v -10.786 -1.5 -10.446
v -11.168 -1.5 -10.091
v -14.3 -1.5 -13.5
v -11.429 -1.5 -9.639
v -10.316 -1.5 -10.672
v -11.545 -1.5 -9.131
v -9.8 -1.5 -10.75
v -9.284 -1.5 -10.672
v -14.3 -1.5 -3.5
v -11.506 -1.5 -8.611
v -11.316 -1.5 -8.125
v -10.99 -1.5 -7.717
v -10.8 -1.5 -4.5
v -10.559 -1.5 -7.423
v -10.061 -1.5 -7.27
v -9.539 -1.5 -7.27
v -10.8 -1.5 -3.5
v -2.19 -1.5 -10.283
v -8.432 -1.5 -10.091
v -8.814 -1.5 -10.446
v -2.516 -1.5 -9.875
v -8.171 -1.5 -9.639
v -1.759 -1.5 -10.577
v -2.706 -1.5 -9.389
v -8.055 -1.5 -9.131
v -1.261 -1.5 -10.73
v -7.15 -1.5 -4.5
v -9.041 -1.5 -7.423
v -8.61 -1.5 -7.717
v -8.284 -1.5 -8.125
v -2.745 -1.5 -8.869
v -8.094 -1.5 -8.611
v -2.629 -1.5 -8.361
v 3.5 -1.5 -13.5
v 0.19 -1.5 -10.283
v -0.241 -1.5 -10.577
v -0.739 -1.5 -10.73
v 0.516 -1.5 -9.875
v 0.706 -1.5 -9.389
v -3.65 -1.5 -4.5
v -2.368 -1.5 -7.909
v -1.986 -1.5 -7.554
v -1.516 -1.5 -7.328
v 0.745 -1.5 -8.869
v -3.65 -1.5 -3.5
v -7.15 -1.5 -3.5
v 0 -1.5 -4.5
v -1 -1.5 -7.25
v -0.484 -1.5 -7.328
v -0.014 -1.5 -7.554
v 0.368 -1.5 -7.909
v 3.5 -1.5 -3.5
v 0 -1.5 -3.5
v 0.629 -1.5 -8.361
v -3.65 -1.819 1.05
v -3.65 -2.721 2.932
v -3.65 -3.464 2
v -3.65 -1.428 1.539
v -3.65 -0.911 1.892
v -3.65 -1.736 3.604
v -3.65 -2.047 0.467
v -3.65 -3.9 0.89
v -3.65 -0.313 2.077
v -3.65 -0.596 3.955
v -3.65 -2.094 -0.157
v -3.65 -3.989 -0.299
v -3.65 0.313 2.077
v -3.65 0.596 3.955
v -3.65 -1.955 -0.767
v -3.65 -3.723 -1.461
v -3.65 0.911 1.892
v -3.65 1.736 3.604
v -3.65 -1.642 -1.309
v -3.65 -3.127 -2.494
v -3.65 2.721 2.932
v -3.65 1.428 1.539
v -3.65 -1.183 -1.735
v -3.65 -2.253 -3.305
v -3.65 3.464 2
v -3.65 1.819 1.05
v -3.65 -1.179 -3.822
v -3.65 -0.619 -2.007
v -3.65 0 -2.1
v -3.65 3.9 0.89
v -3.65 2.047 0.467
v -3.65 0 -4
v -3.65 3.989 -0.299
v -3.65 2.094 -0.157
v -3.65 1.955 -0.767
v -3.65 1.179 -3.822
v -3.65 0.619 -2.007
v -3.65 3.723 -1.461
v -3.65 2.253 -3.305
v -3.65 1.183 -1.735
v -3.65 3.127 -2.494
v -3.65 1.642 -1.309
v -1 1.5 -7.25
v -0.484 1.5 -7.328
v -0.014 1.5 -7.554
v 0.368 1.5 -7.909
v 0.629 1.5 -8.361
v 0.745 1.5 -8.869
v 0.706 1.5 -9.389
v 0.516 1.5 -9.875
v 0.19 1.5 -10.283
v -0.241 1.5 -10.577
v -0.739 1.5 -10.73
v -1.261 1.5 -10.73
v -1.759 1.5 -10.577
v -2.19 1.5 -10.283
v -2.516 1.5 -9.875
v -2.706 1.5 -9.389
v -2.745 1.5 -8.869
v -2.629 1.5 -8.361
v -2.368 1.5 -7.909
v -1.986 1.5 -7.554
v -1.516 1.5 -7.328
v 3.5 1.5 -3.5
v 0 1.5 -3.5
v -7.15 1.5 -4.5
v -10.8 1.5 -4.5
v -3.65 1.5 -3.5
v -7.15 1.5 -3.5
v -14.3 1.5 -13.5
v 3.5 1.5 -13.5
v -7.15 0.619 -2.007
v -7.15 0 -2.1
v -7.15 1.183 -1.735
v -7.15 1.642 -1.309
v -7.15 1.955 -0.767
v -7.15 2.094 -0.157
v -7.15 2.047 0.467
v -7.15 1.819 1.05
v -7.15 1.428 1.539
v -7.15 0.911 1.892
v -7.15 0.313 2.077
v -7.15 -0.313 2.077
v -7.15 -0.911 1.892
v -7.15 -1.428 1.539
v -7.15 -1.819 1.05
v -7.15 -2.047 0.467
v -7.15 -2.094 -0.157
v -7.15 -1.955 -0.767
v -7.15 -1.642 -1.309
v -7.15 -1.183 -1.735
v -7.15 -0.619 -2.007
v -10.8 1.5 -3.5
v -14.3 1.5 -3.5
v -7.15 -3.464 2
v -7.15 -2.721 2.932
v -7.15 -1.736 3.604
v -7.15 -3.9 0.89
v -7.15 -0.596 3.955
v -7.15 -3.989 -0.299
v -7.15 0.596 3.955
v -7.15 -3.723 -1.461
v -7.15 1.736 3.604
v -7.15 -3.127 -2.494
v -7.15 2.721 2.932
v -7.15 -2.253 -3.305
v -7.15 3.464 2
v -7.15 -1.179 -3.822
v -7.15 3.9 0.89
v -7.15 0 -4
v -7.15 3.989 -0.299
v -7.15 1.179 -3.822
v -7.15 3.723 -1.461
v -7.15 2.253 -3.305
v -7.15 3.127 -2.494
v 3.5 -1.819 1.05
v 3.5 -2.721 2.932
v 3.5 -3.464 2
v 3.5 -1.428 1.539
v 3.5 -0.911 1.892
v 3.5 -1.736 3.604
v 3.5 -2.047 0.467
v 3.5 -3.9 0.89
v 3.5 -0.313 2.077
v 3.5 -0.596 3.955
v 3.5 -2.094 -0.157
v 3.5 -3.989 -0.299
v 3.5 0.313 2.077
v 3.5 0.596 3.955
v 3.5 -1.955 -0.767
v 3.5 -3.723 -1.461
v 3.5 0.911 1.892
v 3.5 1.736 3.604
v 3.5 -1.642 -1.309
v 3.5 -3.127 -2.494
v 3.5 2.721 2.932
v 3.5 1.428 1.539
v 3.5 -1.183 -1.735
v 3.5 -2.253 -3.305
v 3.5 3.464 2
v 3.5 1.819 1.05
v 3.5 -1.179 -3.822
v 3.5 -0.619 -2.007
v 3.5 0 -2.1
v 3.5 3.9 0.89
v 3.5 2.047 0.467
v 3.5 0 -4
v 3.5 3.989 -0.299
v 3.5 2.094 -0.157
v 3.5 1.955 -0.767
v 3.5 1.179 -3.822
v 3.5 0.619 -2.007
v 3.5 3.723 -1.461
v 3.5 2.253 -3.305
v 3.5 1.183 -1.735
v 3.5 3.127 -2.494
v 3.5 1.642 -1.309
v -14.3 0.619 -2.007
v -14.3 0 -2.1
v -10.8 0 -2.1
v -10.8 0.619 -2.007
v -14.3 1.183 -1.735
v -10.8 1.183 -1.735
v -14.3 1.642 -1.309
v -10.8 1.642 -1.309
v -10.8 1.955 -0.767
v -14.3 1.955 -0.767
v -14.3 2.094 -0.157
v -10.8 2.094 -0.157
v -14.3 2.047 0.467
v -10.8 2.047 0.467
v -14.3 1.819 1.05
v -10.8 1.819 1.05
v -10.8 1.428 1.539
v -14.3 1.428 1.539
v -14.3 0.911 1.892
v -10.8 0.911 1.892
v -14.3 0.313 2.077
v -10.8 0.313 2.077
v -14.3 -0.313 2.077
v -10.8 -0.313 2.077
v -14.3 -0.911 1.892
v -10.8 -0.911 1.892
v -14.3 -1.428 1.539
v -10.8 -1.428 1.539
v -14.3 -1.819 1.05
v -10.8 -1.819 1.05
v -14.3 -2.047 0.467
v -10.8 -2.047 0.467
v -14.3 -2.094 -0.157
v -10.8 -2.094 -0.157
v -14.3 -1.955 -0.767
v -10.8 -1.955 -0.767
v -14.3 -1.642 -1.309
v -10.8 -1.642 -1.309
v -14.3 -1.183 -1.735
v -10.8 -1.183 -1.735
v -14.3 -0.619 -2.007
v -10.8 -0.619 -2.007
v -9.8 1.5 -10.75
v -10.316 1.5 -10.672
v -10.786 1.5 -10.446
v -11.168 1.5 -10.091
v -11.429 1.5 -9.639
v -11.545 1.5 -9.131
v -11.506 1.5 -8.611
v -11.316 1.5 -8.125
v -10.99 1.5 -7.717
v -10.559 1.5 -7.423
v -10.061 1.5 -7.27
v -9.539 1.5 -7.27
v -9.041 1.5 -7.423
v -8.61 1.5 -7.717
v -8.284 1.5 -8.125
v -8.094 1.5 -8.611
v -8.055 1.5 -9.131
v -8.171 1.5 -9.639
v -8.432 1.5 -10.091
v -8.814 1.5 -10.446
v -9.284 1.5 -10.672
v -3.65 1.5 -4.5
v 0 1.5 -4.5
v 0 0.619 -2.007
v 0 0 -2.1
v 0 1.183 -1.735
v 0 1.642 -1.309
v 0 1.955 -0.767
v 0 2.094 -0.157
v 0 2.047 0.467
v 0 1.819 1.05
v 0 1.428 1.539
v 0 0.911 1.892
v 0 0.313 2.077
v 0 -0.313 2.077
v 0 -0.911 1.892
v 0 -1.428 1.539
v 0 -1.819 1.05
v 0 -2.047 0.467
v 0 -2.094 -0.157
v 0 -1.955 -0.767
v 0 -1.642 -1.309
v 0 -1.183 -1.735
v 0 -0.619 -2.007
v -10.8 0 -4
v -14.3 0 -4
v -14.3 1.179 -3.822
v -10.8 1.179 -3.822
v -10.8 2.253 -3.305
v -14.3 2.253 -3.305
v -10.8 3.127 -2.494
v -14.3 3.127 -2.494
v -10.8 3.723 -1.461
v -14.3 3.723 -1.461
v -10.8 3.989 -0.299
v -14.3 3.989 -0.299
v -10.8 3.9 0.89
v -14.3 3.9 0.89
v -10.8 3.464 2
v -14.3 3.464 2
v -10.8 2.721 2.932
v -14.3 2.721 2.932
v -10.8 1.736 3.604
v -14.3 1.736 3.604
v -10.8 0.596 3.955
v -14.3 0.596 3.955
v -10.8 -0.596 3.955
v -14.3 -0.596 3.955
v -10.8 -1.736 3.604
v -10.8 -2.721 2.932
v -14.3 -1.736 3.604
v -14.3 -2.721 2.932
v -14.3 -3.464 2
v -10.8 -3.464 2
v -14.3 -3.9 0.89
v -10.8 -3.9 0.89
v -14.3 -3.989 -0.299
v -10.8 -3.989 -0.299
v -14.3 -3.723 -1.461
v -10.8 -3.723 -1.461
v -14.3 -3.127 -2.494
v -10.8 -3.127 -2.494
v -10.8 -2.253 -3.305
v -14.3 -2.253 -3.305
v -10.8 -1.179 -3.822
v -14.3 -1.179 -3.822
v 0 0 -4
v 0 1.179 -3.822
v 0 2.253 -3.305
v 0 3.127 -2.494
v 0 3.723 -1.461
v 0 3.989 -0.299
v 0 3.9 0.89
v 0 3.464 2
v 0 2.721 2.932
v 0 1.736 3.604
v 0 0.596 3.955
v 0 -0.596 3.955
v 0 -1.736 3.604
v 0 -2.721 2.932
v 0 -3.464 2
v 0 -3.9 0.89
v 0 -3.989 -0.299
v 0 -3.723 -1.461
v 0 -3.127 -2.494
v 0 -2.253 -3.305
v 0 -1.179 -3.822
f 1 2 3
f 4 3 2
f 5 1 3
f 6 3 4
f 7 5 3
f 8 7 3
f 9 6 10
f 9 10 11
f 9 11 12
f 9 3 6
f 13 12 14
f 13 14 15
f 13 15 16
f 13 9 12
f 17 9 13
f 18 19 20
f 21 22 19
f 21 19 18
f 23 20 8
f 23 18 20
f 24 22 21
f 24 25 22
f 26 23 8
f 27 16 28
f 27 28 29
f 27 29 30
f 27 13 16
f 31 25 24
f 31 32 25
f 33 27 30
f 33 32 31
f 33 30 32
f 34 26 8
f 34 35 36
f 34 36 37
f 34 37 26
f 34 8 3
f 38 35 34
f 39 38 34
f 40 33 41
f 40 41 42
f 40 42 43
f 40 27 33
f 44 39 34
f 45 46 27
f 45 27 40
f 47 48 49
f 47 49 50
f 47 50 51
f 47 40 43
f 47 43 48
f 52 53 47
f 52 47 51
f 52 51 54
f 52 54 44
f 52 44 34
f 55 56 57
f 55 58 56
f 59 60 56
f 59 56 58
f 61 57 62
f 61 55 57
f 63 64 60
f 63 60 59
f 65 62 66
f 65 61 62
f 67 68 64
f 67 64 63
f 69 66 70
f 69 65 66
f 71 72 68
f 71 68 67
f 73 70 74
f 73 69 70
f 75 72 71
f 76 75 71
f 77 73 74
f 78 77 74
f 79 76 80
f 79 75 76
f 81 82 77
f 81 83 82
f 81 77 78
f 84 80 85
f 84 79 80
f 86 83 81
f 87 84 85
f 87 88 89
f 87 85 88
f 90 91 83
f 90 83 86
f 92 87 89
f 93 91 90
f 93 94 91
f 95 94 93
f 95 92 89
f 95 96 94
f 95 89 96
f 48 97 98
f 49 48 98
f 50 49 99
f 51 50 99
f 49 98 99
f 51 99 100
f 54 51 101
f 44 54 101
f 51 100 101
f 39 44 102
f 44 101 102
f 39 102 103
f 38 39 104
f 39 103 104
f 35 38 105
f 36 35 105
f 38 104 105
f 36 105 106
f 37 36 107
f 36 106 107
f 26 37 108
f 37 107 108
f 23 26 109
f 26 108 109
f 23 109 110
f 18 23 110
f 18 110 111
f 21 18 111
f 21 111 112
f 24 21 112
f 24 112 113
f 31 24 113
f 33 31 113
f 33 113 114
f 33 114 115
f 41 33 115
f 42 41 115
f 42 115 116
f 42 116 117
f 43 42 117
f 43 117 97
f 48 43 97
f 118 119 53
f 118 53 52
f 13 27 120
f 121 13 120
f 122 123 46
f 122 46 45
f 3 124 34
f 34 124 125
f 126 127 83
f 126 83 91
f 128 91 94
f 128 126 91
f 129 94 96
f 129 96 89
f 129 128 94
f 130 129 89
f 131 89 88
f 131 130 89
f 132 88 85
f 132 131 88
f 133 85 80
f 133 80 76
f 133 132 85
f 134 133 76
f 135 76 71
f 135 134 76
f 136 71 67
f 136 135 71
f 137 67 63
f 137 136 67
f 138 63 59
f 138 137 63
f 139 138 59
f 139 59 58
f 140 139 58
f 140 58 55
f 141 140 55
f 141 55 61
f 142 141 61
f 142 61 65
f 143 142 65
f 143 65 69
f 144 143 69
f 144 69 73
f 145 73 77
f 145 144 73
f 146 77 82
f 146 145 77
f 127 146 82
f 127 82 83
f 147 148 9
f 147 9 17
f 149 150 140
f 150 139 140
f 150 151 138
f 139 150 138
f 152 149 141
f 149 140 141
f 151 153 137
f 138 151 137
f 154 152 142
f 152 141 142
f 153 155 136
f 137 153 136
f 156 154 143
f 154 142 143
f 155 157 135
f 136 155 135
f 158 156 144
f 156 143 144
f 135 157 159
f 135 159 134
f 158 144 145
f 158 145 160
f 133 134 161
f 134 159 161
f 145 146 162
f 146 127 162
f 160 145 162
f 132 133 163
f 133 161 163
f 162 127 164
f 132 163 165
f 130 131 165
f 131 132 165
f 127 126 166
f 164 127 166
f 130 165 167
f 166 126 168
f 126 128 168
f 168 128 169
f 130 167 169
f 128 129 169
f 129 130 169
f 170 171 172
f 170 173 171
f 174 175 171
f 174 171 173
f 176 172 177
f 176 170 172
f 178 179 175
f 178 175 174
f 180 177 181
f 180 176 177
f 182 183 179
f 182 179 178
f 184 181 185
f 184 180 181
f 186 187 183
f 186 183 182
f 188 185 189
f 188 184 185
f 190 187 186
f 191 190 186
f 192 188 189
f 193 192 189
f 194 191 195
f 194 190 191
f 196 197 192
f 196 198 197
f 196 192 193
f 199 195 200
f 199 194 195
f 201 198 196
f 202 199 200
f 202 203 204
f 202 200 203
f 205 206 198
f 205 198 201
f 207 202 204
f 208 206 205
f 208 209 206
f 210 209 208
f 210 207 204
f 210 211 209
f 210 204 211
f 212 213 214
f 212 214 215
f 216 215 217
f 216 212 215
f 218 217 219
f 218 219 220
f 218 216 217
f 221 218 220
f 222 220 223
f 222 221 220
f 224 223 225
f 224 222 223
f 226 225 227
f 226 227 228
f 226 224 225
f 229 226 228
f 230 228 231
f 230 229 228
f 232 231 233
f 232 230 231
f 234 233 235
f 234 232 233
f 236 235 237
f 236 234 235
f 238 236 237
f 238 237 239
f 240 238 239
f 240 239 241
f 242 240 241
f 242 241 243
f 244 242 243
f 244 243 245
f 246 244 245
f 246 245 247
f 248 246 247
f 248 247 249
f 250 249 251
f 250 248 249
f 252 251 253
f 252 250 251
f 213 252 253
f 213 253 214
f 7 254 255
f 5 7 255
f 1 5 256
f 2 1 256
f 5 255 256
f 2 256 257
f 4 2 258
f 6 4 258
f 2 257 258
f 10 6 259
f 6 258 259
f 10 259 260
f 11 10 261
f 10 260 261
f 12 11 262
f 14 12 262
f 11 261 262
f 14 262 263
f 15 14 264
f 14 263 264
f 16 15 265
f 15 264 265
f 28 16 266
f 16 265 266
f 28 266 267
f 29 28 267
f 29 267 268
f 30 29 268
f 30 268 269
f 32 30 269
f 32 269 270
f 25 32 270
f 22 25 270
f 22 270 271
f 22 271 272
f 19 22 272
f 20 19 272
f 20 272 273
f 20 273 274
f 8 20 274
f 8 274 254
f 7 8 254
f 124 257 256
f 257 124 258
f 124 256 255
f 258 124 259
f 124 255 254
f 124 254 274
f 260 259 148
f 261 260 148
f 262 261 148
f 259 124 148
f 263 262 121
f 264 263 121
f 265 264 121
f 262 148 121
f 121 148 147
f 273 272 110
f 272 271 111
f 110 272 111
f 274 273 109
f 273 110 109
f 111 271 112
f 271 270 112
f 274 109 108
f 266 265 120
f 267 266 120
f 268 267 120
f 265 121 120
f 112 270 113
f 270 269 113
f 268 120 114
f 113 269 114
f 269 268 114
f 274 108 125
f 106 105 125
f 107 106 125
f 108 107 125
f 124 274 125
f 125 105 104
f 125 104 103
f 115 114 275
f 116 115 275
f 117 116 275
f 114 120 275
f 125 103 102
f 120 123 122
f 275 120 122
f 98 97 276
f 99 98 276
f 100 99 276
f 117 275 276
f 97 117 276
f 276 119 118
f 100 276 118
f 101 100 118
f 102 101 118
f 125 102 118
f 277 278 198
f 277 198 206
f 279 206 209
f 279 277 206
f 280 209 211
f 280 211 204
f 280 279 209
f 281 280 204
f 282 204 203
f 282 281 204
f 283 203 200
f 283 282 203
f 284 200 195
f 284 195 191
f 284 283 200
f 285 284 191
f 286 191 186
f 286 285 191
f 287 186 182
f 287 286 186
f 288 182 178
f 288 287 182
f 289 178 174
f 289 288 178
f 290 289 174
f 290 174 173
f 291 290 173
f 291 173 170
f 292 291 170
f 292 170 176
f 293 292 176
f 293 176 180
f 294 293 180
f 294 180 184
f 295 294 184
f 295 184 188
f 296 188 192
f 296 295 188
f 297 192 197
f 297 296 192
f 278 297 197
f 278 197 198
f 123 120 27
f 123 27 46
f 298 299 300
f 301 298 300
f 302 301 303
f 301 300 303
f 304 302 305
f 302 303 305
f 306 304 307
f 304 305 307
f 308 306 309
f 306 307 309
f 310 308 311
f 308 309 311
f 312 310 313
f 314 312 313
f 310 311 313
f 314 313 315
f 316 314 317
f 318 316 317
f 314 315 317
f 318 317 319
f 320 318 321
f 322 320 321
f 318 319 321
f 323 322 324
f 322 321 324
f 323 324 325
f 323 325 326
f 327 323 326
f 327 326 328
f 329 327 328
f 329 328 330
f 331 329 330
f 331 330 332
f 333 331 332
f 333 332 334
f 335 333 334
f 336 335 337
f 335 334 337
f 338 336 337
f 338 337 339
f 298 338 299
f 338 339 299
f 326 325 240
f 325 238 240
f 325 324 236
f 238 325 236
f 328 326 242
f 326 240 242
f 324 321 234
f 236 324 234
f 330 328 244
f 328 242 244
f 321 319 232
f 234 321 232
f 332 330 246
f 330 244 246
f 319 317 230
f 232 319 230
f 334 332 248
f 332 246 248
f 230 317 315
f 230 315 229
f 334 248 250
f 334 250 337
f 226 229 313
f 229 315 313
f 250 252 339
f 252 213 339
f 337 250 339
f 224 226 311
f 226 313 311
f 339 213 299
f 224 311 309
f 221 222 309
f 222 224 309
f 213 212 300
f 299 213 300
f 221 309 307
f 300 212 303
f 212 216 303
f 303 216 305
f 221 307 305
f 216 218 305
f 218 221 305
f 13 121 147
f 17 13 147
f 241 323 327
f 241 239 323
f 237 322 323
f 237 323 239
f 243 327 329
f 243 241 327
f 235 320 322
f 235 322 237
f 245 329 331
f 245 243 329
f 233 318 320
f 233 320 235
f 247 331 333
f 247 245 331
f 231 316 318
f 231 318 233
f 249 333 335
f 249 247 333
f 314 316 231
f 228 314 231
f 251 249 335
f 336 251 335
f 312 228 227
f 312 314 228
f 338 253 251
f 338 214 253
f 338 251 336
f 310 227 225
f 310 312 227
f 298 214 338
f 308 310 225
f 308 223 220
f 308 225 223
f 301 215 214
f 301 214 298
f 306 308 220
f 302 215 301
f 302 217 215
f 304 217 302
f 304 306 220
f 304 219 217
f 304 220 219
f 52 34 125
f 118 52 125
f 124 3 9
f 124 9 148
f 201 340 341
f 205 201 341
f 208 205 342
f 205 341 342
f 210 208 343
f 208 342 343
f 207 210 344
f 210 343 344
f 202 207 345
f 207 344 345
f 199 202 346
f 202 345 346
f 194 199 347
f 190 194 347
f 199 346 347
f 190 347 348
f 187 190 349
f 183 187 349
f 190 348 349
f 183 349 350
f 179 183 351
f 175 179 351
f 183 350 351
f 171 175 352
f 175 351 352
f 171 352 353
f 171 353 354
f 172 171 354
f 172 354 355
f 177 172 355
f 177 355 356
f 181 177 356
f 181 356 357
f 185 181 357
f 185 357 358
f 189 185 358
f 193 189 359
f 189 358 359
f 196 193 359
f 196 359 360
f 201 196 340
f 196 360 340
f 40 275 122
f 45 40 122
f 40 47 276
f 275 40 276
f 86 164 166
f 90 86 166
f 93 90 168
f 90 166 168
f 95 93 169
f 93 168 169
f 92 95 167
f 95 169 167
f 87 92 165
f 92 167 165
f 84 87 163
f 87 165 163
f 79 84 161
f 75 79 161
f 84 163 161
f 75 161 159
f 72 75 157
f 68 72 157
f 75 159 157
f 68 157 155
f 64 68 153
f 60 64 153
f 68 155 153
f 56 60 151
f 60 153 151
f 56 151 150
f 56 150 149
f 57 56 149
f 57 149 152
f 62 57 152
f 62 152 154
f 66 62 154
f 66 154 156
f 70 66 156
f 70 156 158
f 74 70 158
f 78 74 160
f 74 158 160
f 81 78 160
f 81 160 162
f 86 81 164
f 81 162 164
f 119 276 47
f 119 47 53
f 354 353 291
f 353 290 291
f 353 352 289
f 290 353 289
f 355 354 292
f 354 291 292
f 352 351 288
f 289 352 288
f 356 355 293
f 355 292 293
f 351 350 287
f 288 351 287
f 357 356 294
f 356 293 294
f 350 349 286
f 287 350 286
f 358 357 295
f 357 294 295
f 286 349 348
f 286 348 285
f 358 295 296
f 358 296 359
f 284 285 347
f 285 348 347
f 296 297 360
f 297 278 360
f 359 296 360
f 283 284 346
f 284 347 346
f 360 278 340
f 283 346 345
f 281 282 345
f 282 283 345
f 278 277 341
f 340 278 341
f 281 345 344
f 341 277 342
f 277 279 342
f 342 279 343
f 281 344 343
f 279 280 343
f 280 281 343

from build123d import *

# Parameters (mm, degrees)
CROQUIS1_R              = 4
CROQUIS1_R_2            = 2.1
SALIENTE_EXTRUIR1_DEPTH = 3.5
MATRIZL3_COUNT          = 3
MATRIZL3_PITCH          = 7.15
CROQUIS4_W              = 17.8
CROQUIS4_H              = 3
SALIENTE_EXTRUIR2_DEPTH = 10
CROQUIS5_R              = 1.75
CORTAR_EXTRUIR1_DEPTH   = 21.420333004
CROQUIS7_W              = 9.009755456
CROQUIS7_H              = 10.218848088
CORTAR_EXTRUIR2_DEPTH   = 3.65
CROQUIS8_W              = 8.948348818
CROQUIS8_H              = 10.48285432
CORTAR_EXTRUIR3_DEPTH   = 3.65


with BuildPart() as part:
    # Croquis1 → Saliente-Extruir1 (new body)
    with BuildSketch(Plane(origin=(0, 0, 0), x_dir=(0, -1, 0), z_dir=(1, 0, 0))):
        with Locations(Location((0, 0, 0), (0, 0, 90))):
            Circle(CROQUIS1_R)
        with Locations(Location((0, 0, 0), (0, 0, 90))):
            Circle(CROQUIS1_R_2, mode=Mode.SUBTRACT)
    extrude(amount=SALIENTE_EXTRUIR1_DEPTH)


with BuildPart() as matrizl3_1:
    # MatrizL3: pattern copy
    add(part.part.moved(Location(Vector(-1, 0, 0) * (1 * MATRIZL3_PITCH))))


with BuildPart() as matrizl3_2:
    # MatrizL3: pattern copy
    add(part.part.moved(Location(Vector(-1, 0, 0) * (2 * MATRIZL3_PITCH))))


with BuildPart() as body_4:
    # Croquis4 → Saliente-Extruir2 (new body)
    with BuildSketch(Plane.XY.offset(-3.5)):
        with Locations((-5.4, 0)):
            Rectangle(CROQUIS4_W, CROQUIS4_H)
    extrude(amount=-SALIENTE_EXTRUIR2_DEPTH)

    # Croquis5 → Cortar-Extruir1 (cut, through all)
    with BuildSketch(Plane(origin=(0, 1.5, 0), x_dir=(1, 0, 0), z_dir=(0, 1, 0))):
        with Locations(Location((-1, 9, 0), (0, 0, 270))):
            Circle(CROQUIS5_R)
        with Locations(Location((-9.8, 9, 0), (0, 0, 90))):
            Circle(CROQUIS5_R)
    extrude(amount=-CORTAR_EXTRUIR1_DEPTH, mode=Mode.SUBTRACT)

    # Croquis7 → Cortar-Extruir2 (cut)
    with BuildSketch(Plane.ZY):
        with Locations((0.004877728, 0)):
            Rectangle(CROQUIS7_W, CROQUIS7_H)
    extrude(amount=CORTAR_EXTRUIR2_DEPTH, mode=Mode.SUBTRACT)

    # Croquis8 → Cortar-Extruir3 (cut)
    with BuildSketch(Plane.ZY.offset(7.15)):
        with Locations((-0.025825591, 0)):
            Rectangle(CROQUIS8_W, CROQUIS8_H)
    extrude(amount=CORTAR_EXTRUIR3_DEPTH, mode=Mode.SUBTRACT)


solid = Compound([part.part, matrizl3_1.part, matrizl3_2.part, body_4.part])
